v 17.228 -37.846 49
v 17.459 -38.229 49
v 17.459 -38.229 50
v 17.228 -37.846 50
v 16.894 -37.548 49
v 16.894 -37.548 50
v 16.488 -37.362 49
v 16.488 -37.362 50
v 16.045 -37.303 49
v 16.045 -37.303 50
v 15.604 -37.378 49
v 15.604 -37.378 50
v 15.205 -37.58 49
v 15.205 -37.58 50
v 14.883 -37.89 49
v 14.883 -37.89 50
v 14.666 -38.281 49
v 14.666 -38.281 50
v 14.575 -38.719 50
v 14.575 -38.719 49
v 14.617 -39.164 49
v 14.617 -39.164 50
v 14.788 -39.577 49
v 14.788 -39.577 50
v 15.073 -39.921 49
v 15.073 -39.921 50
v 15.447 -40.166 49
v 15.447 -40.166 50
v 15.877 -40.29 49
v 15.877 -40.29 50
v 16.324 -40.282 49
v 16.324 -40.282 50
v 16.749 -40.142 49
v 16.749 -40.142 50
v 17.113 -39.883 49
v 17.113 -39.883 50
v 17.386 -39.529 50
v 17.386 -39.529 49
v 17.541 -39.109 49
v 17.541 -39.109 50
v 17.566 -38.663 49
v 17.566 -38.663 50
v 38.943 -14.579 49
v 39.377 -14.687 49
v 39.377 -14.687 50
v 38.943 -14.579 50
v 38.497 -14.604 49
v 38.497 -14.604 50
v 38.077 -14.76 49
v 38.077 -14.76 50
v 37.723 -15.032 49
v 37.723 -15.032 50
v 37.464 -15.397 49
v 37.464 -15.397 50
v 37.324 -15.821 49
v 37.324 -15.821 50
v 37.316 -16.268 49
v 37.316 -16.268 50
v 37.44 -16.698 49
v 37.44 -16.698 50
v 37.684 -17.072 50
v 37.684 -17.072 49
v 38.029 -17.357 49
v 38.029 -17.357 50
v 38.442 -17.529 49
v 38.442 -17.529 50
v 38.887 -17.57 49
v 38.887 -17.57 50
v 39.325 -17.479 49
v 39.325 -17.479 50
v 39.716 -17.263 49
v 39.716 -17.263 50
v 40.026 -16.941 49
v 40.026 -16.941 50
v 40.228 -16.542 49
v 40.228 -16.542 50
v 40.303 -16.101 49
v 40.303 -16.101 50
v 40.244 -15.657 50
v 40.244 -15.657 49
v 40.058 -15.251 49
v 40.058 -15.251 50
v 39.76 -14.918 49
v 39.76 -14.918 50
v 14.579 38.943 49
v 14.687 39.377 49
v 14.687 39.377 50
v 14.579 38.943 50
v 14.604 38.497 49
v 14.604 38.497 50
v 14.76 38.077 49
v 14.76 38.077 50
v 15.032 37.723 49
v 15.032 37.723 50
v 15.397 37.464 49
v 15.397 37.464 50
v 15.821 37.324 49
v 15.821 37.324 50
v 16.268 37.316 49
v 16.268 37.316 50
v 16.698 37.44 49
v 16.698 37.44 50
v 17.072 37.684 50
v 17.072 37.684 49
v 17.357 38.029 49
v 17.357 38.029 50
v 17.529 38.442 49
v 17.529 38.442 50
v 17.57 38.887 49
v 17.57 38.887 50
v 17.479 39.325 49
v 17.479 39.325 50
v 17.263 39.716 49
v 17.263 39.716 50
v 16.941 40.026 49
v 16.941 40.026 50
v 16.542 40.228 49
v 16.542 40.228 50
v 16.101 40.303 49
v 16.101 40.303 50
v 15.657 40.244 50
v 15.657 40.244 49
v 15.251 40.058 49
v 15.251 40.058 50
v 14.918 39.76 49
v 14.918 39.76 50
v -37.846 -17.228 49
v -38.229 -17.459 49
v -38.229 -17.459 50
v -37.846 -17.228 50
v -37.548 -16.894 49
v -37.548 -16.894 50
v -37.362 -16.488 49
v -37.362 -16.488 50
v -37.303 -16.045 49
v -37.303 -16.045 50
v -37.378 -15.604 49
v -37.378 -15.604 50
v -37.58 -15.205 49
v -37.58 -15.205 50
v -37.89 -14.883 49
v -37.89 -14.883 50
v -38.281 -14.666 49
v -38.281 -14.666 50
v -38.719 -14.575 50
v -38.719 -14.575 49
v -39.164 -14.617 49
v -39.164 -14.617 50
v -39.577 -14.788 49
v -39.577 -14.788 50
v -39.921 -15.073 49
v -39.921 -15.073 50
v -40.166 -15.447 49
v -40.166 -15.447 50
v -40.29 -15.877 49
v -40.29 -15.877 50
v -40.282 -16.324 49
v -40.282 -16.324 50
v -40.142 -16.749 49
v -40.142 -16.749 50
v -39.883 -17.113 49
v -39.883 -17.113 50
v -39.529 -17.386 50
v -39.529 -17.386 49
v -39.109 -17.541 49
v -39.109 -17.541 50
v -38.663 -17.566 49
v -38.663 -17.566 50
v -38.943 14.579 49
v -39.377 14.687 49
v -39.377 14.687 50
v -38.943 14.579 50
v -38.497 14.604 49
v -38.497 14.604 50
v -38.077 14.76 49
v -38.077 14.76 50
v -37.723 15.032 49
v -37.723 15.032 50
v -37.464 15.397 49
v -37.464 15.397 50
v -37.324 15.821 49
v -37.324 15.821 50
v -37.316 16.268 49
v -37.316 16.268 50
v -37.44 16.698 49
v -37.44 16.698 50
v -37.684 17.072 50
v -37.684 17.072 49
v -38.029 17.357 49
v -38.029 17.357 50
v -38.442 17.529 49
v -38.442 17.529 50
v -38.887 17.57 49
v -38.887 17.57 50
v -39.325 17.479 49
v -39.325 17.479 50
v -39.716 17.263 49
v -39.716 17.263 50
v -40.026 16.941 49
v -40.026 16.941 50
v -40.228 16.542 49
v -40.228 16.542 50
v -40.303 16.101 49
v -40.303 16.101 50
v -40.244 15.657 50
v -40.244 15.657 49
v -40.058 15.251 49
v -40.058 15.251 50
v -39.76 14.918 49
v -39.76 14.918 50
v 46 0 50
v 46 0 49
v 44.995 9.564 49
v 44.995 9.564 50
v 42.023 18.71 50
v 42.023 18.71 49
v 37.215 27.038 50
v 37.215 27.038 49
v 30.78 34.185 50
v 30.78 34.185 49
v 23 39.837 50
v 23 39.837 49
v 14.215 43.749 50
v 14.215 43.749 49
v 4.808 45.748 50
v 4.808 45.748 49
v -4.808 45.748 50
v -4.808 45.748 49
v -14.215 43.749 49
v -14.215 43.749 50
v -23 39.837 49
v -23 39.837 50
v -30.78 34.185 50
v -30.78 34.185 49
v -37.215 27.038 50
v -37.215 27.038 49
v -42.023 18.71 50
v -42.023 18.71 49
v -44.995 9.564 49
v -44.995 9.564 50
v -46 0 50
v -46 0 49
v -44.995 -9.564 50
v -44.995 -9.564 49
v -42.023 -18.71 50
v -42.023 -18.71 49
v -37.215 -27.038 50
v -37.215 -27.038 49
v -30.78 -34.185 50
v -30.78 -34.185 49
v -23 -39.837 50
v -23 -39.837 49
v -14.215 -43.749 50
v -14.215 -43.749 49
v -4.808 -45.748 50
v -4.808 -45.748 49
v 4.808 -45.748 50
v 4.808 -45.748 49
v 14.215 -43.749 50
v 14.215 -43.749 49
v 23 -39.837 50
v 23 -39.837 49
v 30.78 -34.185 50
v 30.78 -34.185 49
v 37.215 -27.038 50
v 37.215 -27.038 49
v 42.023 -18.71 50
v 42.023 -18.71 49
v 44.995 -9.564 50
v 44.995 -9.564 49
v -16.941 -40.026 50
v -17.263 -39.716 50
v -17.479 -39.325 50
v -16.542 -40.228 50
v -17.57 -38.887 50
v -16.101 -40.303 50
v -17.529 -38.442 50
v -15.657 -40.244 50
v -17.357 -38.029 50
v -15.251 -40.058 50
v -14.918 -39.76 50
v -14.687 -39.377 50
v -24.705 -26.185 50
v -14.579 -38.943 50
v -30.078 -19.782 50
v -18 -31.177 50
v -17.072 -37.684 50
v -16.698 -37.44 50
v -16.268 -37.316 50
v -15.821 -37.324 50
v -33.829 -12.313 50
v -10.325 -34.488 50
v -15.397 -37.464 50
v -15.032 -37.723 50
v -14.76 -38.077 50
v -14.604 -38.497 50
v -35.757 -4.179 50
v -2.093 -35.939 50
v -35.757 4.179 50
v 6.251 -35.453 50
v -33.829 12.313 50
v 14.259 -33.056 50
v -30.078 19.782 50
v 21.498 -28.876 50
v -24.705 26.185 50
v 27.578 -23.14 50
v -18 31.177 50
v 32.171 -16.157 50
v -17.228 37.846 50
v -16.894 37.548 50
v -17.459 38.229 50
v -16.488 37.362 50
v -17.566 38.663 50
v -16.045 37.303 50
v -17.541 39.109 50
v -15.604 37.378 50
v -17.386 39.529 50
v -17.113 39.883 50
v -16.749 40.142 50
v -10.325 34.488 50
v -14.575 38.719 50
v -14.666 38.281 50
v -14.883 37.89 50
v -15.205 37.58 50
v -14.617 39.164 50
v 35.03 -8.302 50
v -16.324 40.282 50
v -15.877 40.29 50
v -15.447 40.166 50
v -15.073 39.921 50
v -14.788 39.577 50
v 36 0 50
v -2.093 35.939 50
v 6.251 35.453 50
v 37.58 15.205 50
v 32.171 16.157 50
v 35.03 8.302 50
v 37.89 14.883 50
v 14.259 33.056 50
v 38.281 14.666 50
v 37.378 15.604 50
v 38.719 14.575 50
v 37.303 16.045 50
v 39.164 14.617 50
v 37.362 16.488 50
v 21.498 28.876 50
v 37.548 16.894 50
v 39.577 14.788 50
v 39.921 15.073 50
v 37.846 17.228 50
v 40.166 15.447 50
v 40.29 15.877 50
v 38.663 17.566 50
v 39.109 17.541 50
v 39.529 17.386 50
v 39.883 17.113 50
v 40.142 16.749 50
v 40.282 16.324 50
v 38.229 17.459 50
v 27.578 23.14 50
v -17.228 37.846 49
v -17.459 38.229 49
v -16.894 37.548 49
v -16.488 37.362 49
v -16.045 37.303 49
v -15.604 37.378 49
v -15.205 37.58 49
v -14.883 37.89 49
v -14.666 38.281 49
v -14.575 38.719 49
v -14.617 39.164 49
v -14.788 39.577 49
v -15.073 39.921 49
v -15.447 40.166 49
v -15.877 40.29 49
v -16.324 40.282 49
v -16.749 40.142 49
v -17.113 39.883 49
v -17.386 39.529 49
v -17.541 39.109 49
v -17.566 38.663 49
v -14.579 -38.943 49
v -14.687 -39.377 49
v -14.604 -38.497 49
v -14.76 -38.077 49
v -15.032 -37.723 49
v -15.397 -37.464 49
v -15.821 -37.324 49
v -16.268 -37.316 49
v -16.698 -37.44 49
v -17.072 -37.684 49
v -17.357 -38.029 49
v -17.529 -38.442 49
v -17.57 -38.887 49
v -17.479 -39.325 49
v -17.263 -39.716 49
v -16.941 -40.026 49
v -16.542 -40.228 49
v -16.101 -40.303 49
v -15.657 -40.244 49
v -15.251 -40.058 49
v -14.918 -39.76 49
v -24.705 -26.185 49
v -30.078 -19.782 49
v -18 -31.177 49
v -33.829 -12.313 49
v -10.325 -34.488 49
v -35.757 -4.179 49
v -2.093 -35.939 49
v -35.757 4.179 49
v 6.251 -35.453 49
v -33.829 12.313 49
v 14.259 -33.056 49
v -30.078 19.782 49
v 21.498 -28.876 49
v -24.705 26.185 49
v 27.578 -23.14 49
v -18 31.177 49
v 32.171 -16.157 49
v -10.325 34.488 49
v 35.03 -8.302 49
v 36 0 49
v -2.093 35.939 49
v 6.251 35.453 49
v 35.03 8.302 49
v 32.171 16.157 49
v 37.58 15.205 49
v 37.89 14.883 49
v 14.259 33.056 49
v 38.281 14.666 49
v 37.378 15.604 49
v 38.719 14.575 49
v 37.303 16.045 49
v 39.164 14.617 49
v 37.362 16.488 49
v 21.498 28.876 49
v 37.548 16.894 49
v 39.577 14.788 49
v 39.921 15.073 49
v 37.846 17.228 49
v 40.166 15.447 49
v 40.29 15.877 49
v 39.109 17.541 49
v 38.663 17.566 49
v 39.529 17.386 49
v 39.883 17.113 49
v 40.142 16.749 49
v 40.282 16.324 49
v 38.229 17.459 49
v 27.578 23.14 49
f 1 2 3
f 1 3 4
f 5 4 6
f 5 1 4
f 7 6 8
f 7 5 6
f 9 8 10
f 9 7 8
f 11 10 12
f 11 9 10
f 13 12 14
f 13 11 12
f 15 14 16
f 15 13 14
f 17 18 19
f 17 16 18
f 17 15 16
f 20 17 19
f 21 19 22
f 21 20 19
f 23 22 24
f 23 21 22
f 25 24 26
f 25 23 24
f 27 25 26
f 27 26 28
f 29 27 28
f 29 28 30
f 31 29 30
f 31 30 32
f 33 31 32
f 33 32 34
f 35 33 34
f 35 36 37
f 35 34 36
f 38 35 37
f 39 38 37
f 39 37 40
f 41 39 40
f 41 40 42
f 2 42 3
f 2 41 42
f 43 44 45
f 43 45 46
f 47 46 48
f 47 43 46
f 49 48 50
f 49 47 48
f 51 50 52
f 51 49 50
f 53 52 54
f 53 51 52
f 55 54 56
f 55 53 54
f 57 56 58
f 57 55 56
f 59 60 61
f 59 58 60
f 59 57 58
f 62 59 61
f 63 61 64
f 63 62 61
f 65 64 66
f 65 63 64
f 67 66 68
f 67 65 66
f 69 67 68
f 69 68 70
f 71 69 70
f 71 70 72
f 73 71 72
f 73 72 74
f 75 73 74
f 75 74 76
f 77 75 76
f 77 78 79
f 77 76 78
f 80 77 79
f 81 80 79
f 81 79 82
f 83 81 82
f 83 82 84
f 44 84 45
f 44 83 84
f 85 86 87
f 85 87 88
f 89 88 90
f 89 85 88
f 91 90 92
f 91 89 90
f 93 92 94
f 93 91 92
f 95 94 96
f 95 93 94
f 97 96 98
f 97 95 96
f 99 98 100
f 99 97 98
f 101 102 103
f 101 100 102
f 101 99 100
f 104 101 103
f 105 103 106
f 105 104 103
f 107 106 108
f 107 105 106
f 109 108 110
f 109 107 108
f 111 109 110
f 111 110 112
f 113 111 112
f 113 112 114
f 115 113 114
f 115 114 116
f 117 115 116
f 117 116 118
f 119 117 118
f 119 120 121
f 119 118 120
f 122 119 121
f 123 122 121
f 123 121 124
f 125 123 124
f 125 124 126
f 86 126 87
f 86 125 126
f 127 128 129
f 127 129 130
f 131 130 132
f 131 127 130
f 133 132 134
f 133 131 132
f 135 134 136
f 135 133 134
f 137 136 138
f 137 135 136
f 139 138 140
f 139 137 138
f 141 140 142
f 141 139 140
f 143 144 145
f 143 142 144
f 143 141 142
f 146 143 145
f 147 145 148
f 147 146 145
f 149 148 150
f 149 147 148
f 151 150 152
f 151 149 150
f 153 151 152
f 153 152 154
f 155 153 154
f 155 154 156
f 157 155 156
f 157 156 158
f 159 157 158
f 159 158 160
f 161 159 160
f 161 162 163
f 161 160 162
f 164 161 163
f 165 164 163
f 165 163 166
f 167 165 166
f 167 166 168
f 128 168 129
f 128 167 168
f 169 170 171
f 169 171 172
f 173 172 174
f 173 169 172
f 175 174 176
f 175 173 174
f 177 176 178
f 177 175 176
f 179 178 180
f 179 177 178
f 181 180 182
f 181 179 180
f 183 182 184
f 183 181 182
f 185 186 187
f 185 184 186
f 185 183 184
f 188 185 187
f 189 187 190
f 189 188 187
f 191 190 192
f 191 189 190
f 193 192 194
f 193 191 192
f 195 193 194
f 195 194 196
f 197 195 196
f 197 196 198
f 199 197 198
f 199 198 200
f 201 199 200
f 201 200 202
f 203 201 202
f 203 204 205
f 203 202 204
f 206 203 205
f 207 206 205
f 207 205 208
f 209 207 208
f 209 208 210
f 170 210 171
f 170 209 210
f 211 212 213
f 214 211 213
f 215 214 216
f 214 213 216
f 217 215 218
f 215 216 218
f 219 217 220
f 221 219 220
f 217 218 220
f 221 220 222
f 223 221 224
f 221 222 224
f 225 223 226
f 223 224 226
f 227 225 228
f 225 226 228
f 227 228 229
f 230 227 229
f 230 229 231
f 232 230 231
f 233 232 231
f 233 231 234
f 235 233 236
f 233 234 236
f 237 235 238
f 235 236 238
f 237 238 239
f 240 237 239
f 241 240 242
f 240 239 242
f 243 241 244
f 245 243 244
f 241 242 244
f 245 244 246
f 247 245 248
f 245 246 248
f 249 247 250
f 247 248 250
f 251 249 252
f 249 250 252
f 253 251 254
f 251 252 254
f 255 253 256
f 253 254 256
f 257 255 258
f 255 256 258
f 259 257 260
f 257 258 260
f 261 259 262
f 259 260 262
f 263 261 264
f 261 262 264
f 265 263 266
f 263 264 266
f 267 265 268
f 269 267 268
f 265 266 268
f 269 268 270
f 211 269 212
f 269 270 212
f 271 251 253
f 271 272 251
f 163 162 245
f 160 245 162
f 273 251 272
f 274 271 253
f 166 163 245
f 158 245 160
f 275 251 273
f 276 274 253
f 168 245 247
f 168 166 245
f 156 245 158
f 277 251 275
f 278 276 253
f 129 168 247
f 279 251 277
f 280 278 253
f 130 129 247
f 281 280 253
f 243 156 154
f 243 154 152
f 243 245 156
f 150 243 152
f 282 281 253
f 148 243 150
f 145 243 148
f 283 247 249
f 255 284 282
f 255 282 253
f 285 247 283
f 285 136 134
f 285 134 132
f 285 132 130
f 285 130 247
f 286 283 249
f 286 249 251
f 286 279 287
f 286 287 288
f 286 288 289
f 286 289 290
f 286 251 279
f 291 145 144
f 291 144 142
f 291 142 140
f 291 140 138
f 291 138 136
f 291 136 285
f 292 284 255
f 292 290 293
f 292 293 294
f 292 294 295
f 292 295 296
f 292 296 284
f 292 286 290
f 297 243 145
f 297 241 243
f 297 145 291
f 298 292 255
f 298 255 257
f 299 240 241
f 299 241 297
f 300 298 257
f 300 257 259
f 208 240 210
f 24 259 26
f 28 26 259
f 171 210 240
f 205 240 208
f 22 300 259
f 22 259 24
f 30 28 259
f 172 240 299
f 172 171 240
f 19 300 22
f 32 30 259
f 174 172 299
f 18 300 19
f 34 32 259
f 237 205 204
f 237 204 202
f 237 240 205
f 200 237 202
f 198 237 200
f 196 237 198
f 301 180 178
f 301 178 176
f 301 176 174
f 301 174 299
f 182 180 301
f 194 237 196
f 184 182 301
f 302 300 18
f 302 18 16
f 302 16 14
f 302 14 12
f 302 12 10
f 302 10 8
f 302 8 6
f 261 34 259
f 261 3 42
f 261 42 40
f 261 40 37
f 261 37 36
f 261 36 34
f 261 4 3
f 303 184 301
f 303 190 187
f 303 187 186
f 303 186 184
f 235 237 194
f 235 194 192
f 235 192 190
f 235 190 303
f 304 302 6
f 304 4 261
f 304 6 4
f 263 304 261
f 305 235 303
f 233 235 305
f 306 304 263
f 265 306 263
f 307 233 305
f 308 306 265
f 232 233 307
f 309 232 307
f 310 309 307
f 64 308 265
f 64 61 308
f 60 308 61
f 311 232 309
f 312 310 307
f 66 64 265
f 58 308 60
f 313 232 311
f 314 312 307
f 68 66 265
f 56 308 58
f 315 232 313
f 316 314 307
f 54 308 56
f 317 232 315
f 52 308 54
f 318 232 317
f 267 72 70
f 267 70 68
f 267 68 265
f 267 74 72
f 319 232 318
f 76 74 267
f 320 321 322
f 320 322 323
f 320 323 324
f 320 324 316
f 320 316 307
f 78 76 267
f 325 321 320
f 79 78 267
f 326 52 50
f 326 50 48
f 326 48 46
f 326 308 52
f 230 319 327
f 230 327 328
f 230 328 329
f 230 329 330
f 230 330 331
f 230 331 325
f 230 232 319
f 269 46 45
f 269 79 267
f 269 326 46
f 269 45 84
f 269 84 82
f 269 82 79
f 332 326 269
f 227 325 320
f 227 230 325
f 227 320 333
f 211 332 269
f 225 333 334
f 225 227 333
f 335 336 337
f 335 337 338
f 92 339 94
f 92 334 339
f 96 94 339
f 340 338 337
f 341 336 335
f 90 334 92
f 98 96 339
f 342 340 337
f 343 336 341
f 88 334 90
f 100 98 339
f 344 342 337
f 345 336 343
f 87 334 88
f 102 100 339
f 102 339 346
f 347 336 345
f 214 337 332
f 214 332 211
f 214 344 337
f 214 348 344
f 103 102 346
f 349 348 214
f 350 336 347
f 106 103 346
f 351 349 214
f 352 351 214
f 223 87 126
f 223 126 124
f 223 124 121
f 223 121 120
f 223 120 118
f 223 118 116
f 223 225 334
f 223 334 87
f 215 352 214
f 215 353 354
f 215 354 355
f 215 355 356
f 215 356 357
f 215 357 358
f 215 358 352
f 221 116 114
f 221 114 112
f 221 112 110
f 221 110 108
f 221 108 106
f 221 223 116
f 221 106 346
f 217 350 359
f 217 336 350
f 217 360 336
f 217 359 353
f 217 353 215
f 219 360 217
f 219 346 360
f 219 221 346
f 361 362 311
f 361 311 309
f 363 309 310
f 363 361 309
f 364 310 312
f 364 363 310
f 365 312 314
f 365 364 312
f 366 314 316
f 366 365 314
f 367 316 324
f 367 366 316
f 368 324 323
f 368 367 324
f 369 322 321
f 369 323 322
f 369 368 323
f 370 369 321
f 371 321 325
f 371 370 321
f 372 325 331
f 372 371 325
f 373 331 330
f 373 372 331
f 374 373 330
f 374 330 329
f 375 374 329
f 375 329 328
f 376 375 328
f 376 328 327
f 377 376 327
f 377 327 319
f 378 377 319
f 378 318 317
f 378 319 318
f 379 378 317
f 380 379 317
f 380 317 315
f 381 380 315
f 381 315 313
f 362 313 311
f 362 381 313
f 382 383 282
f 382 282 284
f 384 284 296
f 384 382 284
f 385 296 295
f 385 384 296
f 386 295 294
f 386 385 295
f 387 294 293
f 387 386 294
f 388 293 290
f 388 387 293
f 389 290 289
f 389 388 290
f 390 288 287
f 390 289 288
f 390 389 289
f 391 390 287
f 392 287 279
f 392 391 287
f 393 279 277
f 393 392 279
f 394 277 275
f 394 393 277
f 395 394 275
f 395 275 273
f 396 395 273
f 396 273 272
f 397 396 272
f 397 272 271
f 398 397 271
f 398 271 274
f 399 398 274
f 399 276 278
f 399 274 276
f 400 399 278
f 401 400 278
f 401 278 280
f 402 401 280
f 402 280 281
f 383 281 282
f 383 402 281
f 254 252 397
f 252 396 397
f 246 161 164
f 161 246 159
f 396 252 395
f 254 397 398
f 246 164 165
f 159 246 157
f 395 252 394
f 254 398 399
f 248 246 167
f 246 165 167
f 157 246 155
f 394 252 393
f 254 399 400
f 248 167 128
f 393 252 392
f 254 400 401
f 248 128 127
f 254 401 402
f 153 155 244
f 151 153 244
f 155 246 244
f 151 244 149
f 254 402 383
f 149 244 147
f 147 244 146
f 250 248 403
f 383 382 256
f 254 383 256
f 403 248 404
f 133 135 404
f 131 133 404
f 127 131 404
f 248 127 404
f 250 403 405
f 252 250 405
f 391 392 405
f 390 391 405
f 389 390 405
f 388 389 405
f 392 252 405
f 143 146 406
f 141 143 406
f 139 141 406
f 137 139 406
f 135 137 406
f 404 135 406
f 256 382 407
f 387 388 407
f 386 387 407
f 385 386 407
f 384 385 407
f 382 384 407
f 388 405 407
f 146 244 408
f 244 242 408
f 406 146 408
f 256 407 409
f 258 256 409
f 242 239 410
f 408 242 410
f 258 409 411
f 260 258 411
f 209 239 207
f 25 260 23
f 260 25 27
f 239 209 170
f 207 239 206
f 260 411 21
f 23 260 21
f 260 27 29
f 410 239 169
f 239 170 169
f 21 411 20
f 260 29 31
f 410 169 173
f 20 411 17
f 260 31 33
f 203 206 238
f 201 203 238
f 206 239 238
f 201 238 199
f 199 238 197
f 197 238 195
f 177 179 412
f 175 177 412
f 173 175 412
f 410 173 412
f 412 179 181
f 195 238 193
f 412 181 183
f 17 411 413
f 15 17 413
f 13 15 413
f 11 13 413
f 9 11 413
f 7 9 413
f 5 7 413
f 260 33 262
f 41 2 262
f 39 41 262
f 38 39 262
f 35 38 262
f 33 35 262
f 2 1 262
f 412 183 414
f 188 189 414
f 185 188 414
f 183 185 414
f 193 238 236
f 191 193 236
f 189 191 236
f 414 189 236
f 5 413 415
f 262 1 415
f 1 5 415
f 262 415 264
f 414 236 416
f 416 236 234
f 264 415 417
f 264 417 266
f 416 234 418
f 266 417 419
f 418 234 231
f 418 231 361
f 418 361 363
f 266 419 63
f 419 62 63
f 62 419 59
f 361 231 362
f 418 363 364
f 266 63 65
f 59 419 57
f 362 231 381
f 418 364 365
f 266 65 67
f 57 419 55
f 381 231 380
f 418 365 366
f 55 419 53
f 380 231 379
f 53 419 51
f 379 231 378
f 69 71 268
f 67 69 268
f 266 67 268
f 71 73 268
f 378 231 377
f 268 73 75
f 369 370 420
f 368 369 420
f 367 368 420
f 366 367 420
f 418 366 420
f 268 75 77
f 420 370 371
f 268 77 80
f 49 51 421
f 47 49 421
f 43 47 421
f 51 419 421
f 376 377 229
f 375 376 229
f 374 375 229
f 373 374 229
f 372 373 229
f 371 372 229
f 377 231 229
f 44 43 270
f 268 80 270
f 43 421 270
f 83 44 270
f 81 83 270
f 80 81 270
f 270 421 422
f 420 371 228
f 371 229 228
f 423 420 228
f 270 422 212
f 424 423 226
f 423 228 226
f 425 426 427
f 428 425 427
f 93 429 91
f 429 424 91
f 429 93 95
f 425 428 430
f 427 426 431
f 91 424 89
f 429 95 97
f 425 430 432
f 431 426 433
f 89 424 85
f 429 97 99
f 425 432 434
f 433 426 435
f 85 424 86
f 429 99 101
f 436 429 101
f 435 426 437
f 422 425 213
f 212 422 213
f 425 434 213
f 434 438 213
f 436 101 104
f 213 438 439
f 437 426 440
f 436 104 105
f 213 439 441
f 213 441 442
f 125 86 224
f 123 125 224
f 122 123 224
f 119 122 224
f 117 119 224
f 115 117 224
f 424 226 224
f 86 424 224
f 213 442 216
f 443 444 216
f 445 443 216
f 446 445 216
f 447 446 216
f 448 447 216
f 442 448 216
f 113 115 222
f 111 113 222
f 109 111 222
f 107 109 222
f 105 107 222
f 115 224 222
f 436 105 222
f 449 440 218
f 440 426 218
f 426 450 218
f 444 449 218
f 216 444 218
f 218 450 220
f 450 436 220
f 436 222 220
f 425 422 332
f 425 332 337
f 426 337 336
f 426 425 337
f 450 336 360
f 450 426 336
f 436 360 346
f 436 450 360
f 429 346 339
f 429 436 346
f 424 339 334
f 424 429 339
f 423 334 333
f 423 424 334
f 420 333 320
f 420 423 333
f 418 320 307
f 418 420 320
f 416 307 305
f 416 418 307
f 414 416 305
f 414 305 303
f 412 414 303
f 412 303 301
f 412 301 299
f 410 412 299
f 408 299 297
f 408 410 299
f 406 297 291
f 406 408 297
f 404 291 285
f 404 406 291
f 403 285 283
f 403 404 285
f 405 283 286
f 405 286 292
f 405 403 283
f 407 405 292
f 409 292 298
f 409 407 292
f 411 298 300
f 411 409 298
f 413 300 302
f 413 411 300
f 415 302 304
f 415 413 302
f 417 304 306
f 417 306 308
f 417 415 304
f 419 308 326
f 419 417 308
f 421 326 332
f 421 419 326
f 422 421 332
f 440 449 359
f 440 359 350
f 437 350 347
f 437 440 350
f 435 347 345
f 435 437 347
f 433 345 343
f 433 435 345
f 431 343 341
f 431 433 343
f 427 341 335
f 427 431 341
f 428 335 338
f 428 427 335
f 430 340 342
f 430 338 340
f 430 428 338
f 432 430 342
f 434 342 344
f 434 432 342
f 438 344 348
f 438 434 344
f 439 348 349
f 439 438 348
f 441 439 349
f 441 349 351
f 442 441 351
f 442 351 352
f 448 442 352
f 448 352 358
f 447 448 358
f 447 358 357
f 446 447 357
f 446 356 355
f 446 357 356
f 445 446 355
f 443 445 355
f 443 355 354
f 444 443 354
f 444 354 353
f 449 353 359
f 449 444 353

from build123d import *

# Parameters (mm, degrees)
CYLINDER1296_R               = 1.5
CYLINDER1296_DEPTH           = 12
CYLINDER1296_PLACEMENT_ANGLE = 45
CYLINDER1297_R               = 1.5
CYLINDER1297_DEPTH           = 12
CYLINDER1301_R               = 1.5
CYLINDER1301_DEPTH           = 12
CYLINDER1301_PLACEMENT_ANGLE = 135
CYLINDER1300_R               = 1.5
CYLINDER1300_DEPTH           = 12
CYLINDER1302_R               = 1.5
CYLINDER1302_DEPTH           = 12
CYLINDER1302_PLACEMENT_ANGLE = 225
CYLINDER1299_R               = 1.5
CYLINDER1299_DEPTH           = 12
CYLINDER1295_R               = 1.5
CYLINDER1295_DEPTH           = 12
CYLINDER1295_PLACEMENT_ANGLE = 45
CYLINDER1298_R               = 1.5
CYLINDER1298_DEPTH           = 12
COMPOUND928_PLACEMENT_ANGLE  = 22.5
TUBE114_R                    = 46
TUBE114_R_2                  = 36
TUBE114_DEPTH                = 1


with BuildPart() as v_lec1296:
    # Cylinder1296 → Cylinder1296 (new body)
    with BuildSketch(Plane.XY):
        Circle(CYLINDER1296_R)
    extrude(amount=CYLINDER1296_DEPTH)


with BuildPart() as v_lec1296_1:
    # Cylinder1296 placement: moved
    add(v_lec1296.part.moved(Location((29.698485, -29.698485, 33.5))).rotate(Axis((29.698485, -29.698485, 33.5), (0, 0, 1)), CYLINDER1296_PLACEMENT_ANGLE))


with BuildPart() as v_lec1297:
    # Cylinder1297 → Cylinder1297 (new body)
    with BuildSketch(Plane(origin=(42, 0, 33.5), x_dir=(0, 1, 0), z_dir=(0, 0, 1))):
        Circle(CYLINDER1297_R)
    extrude(amount=CYLINDER1297_DEPTH)


with BuildPart() as v_lec1301:
    # Cylinder1301 → Cylinder1301 (new body)
    with BuildSketch(Plane.XY):
        Circle(CYLINDER1301_R)
    extrude(amount=CYLINDER1301_DEPTH)


with BuildPart() as v_lec1301_1:
    # Cylinder1301 placement: moved
    add(v_lec1301.part.moved(Location((29.698485, 29.698485, 33.5))).rotate(Axis((29.698485, 29.698485, 33.5), (0, 0, 1)), CYLINDER1301_PLACEMENT_ANGLE))


with BuildPart() as v_lec1300:
    # Cylinder1300 → Cylinder1300 (new body)
    with BuildSketch(Plane(origin=(0, 42, 33.5), x_dir=(-1, 0, 0), z_dir=(0, 0, 1))):
        Circle(CYLINDER1300_R)
    extrude(amount=CYLINDER1300_DEPTH)


with BuildPart() as v_lec1302:
    # Cylinder1302 → Cylinder1302 (new body)
    with BuildSketch(Plane.XY):
        Circle(CYLINDER1302_R)
    extrude(amount=CYLINDER1302_DEPTH)


with BuildPart() as v_lec1302_1:
    # Cylinder1302 placement: moved
    add(v_lec1302.part.moved(Location((-29.698485, 29.698485, 33.5))).rotate(Axis((-29.698485, 29.698485, 33.5), (0, 0, 1)), CYLINDER1302_PLACEMENT_ANGLE))


with BuildPart() as v_lec1299:
    # Cylinder1299 → Cylinder1299 (new body)
    with BuildSketch(Plane(origin=(-42, 0, 33.5), x_dir=(0, -1, 0), z_dir=(0, 0, 1))):
        Circle(CYLINDER1299_R)
    extrude(amount=CYLINDER1299_DEPTH)


with BuildPart() as v_lec1295:
    # Cylinder1295 → Cylinder1295 (new body)
    with BuildSketch(Plane.XY):
        Circle(CYLINDER1295_R)
    extrude(amount=CYLINDER1295_DEPTH)


with BuildPart() as v_lec1295_1:
    # Cylinder1295 placement: moved
    add(v_lec1295.part.moved(Location((-29.698485, -29.698485, 33.5))).rotate(Axis((-29.698485, -29.698485, 33.5), (0, 0, -1)), CYLINDER1295_PLACEMENT_ANGLE))


with BuildPart() as compound928:
    # Cylinder1298 → Cylinder1298 (new body)
    with BuildSketch(Plane(origin=(0, -42, 33.5), x_dir=(1, 0, 0), z_dir=(0, 0, 1))):
        Circle(CYLINDER1298_R)
    extrude(amount=CYLINDER1298_DEPTH)

    # Compound928: union Válec1296, Válec1297, Válec1301, Válec1300, Válec1302, Válec1299, Válec1295
    add(v_lec1296_1.part)
    add(v_lec1297.part)
    add(v_lec1301_1.part)
    add(v_lec1300.part)
    add(v_lec1302_1.part)
    add(v_lec1299.part)
    add(v_lec1295_1.part)


with BuildPart() as compound928_1:
    # Compound928 placement: moved
    add(compound928.part.moved(Location((0, 0, 4))).rotate(Axis((0, 0, 4), (0, 0, 1)), COMPOUND928_PLACEMENT_ANGLE))


with BuildPart() as j_midi_deep_thin_actuator_washer:
    # Tube114 → Tube114 (new body)
    with BuildSketch(Plane.XY.offset(45)):
        Circle(TUBE114_R)
        Circle(TUBE114_R_2, mode=Mode.SUBTRACT)
    extrude(amount=TUBE114_DEPTH)

    # Cut469: cut Compound928
    add(compound928_1.part, mode=Mode.SUBTRACT)


with BuildPart() as j_midi_deep_thin_actuator_washer_1:
    # Cut469 placement: moved
    add(j_midi_deep_thin_actuator_washer.part.moved(Location((0, 0, 4))))


solid = j_midi_deep_thin_actuator_washer_1.part
